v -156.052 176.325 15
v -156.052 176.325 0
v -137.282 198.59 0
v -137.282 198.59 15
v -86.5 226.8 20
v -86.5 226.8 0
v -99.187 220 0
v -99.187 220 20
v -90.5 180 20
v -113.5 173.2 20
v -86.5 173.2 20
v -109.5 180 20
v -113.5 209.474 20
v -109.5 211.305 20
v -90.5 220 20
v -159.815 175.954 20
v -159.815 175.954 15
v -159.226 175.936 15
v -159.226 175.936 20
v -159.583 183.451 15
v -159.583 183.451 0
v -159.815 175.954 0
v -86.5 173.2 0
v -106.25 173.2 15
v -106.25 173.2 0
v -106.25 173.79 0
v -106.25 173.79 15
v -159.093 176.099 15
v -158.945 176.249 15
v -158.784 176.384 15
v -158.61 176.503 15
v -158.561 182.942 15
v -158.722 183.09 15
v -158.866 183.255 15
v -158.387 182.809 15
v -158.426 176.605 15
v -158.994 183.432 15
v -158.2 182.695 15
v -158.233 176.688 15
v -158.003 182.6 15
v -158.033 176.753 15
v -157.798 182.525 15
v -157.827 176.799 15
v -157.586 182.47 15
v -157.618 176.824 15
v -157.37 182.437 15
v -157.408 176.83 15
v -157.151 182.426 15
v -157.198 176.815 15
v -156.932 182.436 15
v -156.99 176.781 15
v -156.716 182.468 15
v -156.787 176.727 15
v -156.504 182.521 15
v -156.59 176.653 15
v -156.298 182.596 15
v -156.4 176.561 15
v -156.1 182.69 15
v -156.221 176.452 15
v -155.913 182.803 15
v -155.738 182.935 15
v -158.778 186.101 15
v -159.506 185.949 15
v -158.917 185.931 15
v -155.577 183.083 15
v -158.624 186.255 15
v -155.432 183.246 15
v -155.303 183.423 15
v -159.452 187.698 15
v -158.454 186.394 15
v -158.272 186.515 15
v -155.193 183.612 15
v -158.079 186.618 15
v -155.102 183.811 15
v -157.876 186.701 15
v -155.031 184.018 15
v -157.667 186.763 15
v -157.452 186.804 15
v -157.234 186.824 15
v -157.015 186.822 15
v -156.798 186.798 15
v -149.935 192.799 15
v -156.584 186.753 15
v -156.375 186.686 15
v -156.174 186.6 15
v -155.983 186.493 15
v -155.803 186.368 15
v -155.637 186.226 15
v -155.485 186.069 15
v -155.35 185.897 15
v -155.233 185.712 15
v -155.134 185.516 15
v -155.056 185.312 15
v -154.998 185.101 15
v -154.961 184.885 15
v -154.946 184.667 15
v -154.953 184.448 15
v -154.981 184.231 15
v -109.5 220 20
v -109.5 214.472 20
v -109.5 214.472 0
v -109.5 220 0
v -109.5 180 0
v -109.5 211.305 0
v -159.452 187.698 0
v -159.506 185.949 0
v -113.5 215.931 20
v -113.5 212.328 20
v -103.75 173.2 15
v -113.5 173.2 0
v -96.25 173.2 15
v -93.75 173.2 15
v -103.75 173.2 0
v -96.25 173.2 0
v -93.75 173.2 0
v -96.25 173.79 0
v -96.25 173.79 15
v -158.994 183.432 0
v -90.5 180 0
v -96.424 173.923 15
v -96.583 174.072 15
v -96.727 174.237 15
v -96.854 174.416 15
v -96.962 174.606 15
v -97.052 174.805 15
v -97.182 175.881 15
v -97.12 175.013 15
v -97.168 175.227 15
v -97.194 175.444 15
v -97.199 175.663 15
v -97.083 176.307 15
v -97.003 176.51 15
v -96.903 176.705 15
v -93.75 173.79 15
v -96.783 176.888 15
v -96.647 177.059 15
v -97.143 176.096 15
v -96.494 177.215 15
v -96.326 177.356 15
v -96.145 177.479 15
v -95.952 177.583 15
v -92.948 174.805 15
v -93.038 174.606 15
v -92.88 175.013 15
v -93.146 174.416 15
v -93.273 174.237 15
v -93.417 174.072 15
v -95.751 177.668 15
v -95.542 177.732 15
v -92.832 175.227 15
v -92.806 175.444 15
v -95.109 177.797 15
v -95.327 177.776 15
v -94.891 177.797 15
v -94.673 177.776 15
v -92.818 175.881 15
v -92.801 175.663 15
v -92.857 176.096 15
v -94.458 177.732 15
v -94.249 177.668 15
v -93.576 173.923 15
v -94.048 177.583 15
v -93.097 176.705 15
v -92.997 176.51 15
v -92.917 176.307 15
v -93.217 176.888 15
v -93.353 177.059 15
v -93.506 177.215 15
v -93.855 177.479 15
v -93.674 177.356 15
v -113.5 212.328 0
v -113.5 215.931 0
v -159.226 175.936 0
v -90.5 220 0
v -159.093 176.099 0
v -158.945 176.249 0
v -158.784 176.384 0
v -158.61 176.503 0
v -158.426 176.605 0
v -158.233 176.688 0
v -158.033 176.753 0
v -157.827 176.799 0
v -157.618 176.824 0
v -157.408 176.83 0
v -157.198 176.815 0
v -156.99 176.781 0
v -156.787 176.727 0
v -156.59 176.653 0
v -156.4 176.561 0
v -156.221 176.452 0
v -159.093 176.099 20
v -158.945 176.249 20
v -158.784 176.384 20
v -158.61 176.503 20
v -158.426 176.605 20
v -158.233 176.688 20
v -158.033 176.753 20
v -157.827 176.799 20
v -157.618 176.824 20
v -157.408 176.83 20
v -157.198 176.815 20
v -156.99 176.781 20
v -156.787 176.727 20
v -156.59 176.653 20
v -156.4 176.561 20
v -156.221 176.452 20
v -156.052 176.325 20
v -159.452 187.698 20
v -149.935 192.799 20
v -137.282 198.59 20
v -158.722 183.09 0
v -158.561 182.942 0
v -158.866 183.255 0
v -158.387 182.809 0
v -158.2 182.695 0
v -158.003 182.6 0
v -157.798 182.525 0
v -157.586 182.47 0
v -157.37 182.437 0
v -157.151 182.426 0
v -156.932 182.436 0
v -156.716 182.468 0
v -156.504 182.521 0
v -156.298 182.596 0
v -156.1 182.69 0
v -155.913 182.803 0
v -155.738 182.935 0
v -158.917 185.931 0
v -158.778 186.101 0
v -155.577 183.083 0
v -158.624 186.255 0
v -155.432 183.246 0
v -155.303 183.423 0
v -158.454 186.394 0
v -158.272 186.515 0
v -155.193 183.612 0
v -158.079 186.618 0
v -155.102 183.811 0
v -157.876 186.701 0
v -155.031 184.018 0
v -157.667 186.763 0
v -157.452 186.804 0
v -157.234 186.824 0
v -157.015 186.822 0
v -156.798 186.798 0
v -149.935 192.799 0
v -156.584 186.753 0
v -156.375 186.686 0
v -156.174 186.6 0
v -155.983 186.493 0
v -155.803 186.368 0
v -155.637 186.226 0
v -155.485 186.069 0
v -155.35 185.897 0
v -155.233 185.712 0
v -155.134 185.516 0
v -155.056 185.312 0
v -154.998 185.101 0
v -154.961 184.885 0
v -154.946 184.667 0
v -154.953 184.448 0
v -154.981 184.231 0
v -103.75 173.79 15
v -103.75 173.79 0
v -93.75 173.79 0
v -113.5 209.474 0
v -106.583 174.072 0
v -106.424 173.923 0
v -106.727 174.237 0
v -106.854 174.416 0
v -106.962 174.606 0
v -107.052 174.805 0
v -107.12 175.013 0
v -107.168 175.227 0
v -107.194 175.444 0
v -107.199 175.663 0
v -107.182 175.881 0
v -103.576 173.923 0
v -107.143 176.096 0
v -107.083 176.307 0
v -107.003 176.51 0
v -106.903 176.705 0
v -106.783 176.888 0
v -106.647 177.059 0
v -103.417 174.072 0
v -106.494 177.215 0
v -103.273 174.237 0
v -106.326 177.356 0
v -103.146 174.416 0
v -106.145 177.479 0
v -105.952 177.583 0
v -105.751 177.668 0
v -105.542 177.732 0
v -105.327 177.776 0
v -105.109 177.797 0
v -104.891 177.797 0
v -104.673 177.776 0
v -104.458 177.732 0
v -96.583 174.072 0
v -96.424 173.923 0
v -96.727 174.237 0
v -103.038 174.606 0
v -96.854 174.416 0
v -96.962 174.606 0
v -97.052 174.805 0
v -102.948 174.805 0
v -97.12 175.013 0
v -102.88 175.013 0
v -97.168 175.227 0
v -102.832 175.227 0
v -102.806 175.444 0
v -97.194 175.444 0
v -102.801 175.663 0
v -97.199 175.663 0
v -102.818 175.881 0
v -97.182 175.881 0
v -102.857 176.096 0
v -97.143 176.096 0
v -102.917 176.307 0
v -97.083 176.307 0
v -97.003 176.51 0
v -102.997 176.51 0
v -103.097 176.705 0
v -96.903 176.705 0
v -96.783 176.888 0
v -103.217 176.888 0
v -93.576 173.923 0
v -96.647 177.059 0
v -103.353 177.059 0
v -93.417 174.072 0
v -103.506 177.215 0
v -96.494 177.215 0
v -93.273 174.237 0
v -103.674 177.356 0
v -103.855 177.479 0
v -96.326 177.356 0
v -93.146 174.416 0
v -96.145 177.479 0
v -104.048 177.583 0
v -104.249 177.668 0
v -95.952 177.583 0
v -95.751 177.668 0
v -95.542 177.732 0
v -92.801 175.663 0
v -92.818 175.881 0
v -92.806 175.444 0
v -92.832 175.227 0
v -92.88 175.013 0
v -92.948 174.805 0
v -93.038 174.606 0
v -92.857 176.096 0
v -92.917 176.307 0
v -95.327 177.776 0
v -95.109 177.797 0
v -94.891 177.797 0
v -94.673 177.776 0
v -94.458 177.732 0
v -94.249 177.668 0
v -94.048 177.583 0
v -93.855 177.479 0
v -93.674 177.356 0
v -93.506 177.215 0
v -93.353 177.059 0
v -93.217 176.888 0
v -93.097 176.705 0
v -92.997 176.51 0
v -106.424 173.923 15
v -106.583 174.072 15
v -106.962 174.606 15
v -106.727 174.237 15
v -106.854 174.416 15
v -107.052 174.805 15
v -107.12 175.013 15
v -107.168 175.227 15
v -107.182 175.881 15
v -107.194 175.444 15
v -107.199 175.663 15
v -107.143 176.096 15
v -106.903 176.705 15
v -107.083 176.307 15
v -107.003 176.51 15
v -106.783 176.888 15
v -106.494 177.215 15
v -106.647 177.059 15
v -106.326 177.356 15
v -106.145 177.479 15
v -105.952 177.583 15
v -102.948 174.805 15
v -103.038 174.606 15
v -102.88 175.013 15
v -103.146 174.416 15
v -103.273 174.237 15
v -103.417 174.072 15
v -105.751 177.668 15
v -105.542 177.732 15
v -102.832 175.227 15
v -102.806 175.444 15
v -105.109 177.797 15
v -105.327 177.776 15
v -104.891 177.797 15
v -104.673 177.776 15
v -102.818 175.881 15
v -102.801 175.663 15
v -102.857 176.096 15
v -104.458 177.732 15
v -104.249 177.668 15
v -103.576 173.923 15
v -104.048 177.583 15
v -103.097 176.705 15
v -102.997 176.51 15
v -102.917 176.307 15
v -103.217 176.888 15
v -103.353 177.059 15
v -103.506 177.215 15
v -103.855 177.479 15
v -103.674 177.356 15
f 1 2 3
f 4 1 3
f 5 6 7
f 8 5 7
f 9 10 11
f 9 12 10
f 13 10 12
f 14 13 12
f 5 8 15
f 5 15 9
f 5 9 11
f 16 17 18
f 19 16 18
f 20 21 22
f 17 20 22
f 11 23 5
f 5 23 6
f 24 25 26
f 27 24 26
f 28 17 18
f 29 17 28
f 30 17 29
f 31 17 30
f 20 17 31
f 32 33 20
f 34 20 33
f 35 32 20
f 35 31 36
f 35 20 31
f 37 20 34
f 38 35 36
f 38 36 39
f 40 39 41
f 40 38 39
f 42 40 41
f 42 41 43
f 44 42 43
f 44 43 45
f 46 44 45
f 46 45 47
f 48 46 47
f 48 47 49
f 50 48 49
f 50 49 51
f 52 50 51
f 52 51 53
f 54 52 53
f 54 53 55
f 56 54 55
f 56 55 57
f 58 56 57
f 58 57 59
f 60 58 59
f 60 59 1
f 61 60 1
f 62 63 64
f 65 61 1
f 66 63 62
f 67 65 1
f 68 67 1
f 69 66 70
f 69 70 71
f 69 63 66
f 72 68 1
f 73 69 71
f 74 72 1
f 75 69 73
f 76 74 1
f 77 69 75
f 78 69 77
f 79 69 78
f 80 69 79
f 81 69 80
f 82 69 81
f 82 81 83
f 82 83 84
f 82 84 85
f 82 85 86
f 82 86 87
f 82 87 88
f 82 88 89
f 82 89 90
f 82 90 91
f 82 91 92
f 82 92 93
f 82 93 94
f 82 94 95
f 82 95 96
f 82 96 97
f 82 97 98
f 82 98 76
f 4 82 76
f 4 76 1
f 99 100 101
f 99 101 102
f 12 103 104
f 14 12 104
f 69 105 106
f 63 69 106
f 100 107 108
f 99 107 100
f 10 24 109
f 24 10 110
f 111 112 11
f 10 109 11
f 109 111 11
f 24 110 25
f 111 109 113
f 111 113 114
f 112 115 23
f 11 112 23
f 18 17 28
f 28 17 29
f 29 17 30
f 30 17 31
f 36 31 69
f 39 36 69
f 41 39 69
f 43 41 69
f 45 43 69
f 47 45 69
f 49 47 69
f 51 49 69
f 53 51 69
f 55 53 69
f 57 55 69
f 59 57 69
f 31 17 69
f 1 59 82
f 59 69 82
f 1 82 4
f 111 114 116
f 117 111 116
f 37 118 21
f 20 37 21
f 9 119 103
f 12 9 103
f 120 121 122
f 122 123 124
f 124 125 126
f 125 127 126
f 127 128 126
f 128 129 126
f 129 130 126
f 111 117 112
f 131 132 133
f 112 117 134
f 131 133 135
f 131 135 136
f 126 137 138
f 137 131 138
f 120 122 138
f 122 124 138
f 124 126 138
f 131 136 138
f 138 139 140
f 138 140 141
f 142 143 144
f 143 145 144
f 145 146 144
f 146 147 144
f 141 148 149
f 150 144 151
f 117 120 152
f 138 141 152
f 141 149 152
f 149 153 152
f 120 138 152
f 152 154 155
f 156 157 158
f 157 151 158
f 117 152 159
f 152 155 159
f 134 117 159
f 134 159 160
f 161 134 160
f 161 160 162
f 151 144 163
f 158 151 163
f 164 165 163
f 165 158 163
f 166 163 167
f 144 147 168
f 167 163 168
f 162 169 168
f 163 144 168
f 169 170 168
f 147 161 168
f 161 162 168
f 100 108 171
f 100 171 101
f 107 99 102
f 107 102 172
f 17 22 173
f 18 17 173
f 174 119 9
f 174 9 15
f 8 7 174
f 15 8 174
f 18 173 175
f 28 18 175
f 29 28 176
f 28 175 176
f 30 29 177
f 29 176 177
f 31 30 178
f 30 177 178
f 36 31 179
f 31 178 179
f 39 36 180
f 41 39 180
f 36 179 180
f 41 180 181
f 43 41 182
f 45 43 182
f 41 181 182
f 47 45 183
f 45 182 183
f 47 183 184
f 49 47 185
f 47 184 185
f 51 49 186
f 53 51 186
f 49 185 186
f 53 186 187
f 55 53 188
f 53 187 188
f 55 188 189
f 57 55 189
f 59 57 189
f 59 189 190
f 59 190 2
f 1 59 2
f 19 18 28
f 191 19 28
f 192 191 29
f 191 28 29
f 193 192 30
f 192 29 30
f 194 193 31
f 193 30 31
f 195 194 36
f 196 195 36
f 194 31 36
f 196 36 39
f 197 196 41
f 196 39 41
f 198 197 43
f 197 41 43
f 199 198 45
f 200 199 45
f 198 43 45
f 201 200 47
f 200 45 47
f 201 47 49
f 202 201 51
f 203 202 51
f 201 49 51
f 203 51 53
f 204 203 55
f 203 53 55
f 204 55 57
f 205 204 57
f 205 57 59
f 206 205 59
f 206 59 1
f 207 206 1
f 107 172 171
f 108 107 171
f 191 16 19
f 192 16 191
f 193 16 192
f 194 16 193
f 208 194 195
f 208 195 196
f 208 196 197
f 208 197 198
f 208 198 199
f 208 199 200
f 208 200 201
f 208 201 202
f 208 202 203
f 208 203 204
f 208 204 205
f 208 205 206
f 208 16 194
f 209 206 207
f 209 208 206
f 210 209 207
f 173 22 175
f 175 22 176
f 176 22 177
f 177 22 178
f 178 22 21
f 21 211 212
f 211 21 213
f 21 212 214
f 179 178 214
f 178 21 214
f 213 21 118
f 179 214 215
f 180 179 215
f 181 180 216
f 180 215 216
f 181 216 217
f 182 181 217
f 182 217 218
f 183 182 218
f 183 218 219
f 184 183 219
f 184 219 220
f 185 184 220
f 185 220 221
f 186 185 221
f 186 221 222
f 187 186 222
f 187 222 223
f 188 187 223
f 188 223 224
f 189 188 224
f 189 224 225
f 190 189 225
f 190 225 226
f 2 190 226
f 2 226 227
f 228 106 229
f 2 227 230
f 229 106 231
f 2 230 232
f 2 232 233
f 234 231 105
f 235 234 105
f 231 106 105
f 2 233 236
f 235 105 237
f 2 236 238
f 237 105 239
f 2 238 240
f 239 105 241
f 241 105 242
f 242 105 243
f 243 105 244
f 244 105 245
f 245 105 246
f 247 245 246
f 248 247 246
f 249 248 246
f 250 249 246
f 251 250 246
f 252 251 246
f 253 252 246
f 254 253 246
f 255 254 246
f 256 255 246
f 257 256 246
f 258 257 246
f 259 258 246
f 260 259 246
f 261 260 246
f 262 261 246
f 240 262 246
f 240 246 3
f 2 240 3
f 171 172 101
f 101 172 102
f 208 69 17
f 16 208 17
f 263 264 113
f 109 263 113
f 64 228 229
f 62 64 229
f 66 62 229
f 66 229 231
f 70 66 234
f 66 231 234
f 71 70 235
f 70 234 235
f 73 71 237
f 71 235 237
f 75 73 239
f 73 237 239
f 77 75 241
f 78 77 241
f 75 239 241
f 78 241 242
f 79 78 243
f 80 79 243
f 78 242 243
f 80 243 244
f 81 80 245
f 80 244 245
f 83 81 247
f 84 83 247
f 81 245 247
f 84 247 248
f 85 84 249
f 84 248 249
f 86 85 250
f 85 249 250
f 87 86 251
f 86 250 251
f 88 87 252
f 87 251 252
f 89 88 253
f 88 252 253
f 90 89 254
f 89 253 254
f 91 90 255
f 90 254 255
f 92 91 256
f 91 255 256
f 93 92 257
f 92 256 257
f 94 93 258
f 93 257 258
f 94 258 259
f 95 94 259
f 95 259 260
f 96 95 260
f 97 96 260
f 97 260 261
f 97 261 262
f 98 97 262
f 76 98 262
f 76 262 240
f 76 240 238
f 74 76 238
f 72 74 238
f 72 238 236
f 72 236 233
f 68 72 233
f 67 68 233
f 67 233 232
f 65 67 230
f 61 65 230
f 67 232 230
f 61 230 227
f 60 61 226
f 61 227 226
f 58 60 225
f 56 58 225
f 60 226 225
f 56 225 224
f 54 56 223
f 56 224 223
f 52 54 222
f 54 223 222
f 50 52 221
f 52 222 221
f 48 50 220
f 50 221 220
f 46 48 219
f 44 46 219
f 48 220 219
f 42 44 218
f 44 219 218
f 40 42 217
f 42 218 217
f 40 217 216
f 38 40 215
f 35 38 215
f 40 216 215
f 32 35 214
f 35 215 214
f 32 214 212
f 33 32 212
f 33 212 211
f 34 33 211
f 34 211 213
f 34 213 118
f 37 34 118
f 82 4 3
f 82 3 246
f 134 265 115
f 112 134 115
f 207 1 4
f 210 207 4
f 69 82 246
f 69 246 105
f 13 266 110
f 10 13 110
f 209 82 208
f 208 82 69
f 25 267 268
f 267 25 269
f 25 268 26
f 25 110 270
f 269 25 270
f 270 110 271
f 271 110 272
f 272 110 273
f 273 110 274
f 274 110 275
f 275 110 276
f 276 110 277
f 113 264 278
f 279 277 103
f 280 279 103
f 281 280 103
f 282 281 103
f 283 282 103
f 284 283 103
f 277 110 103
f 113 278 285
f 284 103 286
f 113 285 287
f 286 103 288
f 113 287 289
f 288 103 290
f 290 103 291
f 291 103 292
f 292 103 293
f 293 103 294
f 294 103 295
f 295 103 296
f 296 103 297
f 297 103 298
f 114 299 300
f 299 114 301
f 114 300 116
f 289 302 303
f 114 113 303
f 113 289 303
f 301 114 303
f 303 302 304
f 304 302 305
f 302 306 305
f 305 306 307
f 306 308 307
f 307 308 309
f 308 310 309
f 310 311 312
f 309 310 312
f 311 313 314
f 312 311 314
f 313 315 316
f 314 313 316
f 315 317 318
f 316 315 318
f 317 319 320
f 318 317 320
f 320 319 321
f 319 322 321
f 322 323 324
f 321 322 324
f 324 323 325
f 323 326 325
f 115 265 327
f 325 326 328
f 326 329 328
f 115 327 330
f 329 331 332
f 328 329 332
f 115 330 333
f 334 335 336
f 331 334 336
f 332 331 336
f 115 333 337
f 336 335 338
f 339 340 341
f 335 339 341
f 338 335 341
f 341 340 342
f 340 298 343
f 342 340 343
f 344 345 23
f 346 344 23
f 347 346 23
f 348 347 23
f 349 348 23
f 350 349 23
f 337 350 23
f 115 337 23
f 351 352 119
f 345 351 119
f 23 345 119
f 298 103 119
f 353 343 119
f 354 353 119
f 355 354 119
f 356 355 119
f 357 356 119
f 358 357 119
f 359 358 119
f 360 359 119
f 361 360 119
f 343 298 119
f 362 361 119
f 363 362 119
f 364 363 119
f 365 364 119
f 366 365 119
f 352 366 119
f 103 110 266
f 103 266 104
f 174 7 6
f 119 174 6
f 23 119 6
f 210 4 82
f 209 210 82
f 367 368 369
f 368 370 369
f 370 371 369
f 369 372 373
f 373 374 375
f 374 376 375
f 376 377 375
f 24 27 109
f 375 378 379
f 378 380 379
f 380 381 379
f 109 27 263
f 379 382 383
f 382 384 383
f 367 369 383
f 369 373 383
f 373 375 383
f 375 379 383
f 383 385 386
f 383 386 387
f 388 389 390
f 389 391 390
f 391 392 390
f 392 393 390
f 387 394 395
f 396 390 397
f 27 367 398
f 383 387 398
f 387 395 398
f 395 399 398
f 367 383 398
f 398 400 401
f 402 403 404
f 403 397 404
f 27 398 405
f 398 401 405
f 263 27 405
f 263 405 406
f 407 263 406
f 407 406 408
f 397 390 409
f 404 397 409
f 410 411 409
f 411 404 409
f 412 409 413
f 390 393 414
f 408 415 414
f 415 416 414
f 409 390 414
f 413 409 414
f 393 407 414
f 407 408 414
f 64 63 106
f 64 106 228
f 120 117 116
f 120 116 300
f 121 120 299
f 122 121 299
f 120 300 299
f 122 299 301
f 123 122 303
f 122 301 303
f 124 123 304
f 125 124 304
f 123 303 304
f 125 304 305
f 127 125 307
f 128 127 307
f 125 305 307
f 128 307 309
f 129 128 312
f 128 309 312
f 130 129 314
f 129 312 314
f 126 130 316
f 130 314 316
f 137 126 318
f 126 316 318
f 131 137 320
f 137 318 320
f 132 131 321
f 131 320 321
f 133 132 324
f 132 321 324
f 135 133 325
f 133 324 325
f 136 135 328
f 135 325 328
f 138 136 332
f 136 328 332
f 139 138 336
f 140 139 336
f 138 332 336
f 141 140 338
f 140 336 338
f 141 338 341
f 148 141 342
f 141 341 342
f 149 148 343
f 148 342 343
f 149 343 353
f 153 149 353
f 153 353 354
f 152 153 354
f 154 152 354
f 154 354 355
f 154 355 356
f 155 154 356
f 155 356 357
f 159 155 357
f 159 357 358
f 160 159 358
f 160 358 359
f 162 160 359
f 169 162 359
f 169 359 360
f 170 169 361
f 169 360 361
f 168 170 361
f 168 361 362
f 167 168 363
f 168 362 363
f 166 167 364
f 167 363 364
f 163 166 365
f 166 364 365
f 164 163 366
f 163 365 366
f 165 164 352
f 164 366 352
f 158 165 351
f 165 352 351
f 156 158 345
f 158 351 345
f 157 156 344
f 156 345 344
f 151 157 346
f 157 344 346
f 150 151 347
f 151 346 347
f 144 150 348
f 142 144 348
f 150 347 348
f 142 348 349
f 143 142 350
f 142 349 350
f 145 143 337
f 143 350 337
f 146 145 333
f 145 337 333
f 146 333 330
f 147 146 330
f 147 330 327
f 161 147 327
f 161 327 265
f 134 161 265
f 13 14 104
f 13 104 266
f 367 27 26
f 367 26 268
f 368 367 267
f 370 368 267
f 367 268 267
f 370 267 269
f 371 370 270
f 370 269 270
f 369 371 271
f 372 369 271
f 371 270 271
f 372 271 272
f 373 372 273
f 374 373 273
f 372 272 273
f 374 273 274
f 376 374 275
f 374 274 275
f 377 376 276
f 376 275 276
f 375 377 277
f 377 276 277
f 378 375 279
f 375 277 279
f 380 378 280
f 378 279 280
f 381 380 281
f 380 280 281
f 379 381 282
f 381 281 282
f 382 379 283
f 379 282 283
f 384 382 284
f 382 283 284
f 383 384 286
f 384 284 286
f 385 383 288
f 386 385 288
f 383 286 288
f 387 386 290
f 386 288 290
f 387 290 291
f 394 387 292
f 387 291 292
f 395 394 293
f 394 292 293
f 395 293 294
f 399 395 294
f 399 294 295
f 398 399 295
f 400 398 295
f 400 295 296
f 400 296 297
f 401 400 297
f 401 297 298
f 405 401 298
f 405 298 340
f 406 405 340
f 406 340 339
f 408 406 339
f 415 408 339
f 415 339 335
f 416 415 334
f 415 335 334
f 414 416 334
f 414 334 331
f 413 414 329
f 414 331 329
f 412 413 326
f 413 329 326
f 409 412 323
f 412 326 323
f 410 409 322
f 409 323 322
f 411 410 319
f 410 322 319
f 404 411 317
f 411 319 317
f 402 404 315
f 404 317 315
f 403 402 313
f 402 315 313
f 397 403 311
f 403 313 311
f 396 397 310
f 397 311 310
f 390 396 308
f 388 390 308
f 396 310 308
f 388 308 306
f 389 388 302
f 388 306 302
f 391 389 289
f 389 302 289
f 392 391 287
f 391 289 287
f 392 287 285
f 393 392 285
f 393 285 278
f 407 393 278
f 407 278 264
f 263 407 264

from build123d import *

# Parameters (mm, degrees)
BOSS_EXTRUDE2_DEPTH   = 15
BOSS_EXTRUDE2_2_DEPTH = 15
SKETCH1_3_W           = 4
SKETCH1_3_H           = 40
BOSS_EXTRUDE3_DEPTH   = 20
BOSS_EXTRUDE3_2_DEPTH = 20
BOSS_EXTRUDE4_DEPTH   = 20
BOSS_EXTRUDE5_DEPTH   = 5


with BuildPart() as part:
    # Sketch1 → Boss-Extrude2 (new body)
    with BuildSketch(Plane.XY):
        with BuildLine():
            Line((-90.5, 174.7), (-90.5, 180))
            Line((-90.5, 180), (-109.5, 180))
            Line((-109.5, 180), (-109.5, 174.7))
            ThreePointArc((-109.5, 174.7), (-109.060660172, 173.639339828), (-108, 173.2))
            Line((-108, 173.2), (-106.25, 173.2))
            Line((-106.25, 173.2), (-106.25, 173.789613301))
            ThreePointArc((-106.25, 173.789613301), (-105, 177.8), (-103.75, 173.789613301))
            Line((-103.75, 173.789613301), (-103.75, 173.2))
            Line((-103.75, 173.2), (-96.25, 173.2))
            Line((-96.25, 173.2), (-96.25, 173.789613301))
            ThreePointArc((-96.25, 173.789613301), (-95, 177.8), (-93.75, 173.789613301))
            Line((-93.75, 173.789613301), (-93.75, 173.2))
            Line((-93.75, 173.2), (-92, 173.2))
            ThreePointArc((-92, 173.2), (-90.939339828, 173.639339828), (-90.5, 174.7))
        make_face()
    extrude(amount=BOSS_EXTRUDE2_DEPTH)



with BuildPart() as body_2:
    # Sketch1 → Boss-Extrude2 2 (new body)
    with BuildSketch(Plane.XY):
        with BuildLine():
            Line((-156.05225023, 176.325380111), (-137.282205372, 198.590028265))
            Line((-137.282205372, 198.590028265), (-149.934908507, 192.799492861))
            Line((-149.934908507, 192.799492861), (-159.451892195, 187.698480193))
            Line((-159.451892195, 187.698480193), (-159.505987475, 185.949316479))
            Line((-159.505987475, 185.949316479), (-158.916655937, 185.931090595))
            ThreePointArc((-158.916655937, 185.931090595), (-154.946825197, 184.557720517), (-158.993934909, 183.432285288))
            Line((-158.993934909, 183.432285288), (-159.583266447, 183.450511172))
            Line((-159.583266447, 183.450511172), (-159.815103362, 175.954095252))
            Line((-159.815103362, 175.954095252), (-159.225771824, 175.935869368))
            ThreePointArc((-159.225771824, 175.935869368), (-157.722901503, 176.814118695), (-156.05225023, 176.325380111))
        make_face()
    extrude(amount=BOSS_EXTRUDE2_2_DEPTH)


with BuildPart() as body_3:
    # Sketch1<3> → Boss-Extrude3 (new body)
    with BuildSketch(Plane.XY):
        with Locations((-88.5, 200)):
            Rectangle(SKETCH1_3_W, SKETCH1_3_H)
    extrude(amount=BOSS_EXTRUDE3_DEPTH)


with BuildPart() as body_4:
    # Sketch1<3> → Boss-Extrude3 2 (new body)
    with BuildSketch(Plane.XY):
        Polygon((-109.5, 180), (-109.5, 211.304611235), (-113.5, 209.474003075), (-113.5, 180), align=None)
    extrude(amount=BOSS_EXTRUDE3_2_DEPTH)


with BuildPart() as part_1:
    add(part.part)

    add(body_3.part)  # Boss-Extrude4 merges body 3

    add(body_4.part)  # Boss-Extrude4 merges body 4
    # Sketch1<4> → Boss-Extrude4 (add)
    with BuildSketch(Plane.XY):
        Polygon((-99.186792467, 220), (-86.5, 220), (-86.5, 226.8), align=None)
        with BuildLine():
            Line((-86.5, 180), (-90.5, 180))
            Line((-90.5, 180), (-90.5, 174.7))
            ThreePointArc((-90.5, 174.7), (-90.939339828, 173.639339828), (-92, 173.2))
            Line((-92, 173.2), (-86.5, 173.2))
            Line((-86.5, 173.2), (-86.5, 180))
        make_face()
        with BuildLine():
            Line((-109.5, 174.7), (-109.5, 180))
            Line((-109.5, 180), (-113.5, 180))
            Line((-113.5, 180), (-113.5, 173.2))
            Line((-113.5, 173.2), (-108, 173.2))
            ThreePointArc((-108, 173.2), (-109.060660172, 173.639339828), (-109.5, 174.7))
        make_face()
        Polygon((-113.5, 212.328257006), (-109.5, 214.472218931), (-109.5, 220), (-113.5, 215.93093276), align=None)
    extrude(amount=BOSS_EXTRUDE4_DEPTH)

    # Sketch2 → Boss-Extrude5 (add)
    with BuildSketch(Plane.XY.offset(15)):
        with BuildLine():
            Line((-159.815103362, 175.954095252), (-159.225771824, 175.935869368))
            ThreePointArc((-159.225771824, 175.935869368), (-157.722901503, 176.814118695), (-156.05225023, 176.325380111))
            Line((-156.05225023, 176.325380111), (-137.282205372, 198.590028265))
            Line((-137.282205372, 198.590028265), (-149.934908507, 192.799492861))
            Line((-149.934908507, 192.799492861), (-159.451892195, 187.698480193))
            Line((-159.451892195, 187.698480193), (-159.815103362, 175.954095252))
        make_face()
        with BuildLine():
            ThreePointArc((-92, 173.2), (-90.939339828, 173.639339828), (-90.5, 174.7))
            Line((-90.5, 174.7), (-90.5, 180))
            Line((-90.5, 180), (-109.5, 180))
            Line((-109.5, 180), (-109.5, 174.7))
            ThreePointArc((-109.5, 174.7), (-109.060660172, 173.639339828), (-108, 173.2))
            Line((-108, 173.2), (-92, 173.2))
        make_face()
    extrude(amount=BOSS_EXTRUDE5_DEPTH)


solid = Compound([body_2.part, part_1.part])
